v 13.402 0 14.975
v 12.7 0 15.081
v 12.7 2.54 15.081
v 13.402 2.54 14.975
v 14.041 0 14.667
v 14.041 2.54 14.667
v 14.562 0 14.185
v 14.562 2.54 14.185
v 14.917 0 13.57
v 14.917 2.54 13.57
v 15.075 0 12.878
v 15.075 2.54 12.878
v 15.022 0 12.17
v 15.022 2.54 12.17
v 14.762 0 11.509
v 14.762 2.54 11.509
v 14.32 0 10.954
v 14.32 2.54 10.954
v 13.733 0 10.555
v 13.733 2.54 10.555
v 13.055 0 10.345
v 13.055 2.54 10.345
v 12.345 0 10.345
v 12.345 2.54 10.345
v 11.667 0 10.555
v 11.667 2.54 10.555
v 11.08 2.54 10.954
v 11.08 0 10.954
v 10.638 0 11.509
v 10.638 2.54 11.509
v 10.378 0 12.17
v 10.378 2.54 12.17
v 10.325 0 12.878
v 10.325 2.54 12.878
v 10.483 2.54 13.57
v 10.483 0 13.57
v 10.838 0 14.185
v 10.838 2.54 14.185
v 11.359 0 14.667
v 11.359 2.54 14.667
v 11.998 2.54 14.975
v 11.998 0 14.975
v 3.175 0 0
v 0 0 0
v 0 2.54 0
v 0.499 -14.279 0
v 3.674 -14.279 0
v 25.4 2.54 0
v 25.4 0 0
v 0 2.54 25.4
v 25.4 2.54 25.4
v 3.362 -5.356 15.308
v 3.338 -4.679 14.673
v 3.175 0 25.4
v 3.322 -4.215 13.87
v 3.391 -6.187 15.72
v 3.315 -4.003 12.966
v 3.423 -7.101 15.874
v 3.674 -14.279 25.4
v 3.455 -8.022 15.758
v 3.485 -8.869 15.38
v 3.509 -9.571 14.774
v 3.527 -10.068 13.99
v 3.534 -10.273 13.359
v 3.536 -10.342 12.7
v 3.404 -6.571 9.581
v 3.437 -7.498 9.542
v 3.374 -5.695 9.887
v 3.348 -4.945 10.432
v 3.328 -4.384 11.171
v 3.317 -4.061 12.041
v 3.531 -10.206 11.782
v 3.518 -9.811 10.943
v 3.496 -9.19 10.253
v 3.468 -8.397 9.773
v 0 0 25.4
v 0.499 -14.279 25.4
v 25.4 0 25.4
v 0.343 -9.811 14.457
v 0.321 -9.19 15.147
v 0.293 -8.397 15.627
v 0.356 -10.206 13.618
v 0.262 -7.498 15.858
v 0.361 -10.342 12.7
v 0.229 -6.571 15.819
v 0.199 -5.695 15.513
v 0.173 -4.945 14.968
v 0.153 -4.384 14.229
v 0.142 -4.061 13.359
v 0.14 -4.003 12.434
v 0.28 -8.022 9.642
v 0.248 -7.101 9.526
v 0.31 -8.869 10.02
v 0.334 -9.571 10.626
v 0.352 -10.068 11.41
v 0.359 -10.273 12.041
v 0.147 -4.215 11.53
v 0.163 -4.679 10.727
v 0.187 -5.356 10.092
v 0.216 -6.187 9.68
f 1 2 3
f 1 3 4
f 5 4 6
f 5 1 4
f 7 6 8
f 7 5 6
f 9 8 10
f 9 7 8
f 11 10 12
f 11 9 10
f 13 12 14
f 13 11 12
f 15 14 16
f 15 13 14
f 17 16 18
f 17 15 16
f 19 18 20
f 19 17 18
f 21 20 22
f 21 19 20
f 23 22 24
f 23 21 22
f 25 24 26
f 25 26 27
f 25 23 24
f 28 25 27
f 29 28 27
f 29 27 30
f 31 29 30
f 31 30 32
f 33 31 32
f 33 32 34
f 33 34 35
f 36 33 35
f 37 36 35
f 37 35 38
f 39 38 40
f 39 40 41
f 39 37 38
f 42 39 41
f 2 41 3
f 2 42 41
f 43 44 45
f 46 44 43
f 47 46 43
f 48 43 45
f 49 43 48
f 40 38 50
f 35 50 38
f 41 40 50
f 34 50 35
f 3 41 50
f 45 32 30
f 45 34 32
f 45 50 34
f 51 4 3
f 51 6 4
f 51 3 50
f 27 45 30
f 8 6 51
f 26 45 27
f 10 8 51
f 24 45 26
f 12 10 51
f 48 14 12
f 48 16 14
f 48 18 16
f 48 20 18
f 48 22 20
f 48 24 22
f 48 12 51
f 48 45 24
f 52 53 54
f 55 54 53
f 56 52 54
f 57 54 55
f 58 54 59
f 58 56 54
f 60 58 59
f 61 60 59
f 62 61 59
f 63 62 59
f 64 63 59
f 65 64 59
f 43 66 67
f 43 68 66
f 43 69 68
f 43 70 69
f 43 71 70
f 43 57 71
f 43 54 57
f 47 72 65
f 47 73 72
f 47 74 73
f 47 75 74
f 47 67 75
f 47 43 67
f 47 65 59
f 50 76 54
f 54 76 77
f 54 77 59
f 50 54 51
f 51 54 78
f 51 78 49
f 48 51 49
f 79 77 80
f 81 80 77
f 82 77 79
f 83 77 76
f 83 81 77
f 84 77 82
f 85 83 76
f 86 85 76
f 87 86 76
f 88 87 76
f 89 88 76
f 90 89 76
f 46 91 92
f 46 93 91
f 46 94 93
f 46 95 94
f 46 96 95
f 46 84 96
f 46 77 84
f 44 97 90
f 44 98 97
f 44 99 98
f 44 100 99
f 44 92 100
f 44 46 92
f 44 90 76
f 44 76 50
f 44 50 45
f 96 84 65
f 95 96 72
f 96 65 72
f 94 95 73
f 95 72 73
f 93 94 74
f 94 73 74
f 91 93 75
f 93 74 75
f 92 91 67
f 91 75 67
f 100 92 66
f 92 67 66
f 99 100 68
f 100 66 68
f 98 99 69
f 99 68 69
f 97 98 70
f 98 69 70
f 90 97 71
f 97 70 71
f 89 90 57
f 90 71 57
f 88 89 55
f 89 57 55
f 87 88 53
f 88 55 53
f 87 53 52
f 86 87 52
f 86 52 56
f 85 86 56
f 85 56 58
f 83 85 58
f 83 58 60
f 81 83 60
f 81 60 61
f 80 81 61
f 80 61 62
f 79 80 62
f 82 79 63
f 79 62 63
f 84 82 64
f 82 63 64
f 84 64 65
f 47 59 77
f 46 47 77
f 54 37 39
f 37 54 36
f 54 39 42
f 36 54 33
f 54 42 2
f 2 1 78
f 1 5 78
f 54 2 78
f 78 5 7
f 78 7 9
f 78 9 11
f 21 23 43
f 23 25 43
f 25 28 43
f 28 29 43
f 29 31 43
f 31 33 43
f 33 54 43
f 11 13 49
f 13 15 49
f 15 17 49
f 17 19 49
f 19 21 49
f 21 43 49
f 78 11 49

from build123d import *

# Parameters (mm, degrees)
BOSS_EXTRUDE1_DEPTH = 25.4
SKETCH2_W           = 25.4
SKETCH2_H           = 25.4
SKETCH2_R           = 2.38125
BOSS_EXTRUDE2_DEPTH = 2.54
SKETCH3_R           = 3.175
CUT_EXTRUDE1_DEPTH  = 41.148


with BuildPart() as part:
    # Sketch1 → Boss-Extrude1 (new body)
    with BuildSketch(Plane.XY):
        Polygon((0, 0), (3.175, 0), (3.673626559, -14.278796441), (0.498626559, -14.278796441), align=None)
    extrude(amount=BOSS_EXTRUDE1_DEPTH)

    # Sketch2 → Boss-Extrude2 (add)
    with BuildSketch(Plane(origin=(0, 0, 0), x_dir=(1, 0, 0), z_dir=(0, 1, 0))):
        with Locations((12.7, -12.7)):
            Rectangle(SKETCH2_W, SKETCH2_H)
        with Locations(Location((12.7, -12.7, 0), (0, 0, 270))):
            Circle(SKETCH2_R, mode=Mode.SUBTRACT)
    extrude(amount=BOSS_EXTRUDE2_DEPTH)

    # Sketch3 → Cut-Extrude1 (cut)
    with BuildSketch(Plane(origin=(25.4, 0, 0), x_dir=(0, 0, -1), z_dir=(1, 0, 0))):
        with Locations(Location((-12.7, -7.166796441, 0), (0, 0, 270))):
            Circle(SKETCH3_R)
    extrude(amount=-CUT_EXTRUDE1_DEPTH, mode=Mode.SUBTRACT)


solid = part.part
